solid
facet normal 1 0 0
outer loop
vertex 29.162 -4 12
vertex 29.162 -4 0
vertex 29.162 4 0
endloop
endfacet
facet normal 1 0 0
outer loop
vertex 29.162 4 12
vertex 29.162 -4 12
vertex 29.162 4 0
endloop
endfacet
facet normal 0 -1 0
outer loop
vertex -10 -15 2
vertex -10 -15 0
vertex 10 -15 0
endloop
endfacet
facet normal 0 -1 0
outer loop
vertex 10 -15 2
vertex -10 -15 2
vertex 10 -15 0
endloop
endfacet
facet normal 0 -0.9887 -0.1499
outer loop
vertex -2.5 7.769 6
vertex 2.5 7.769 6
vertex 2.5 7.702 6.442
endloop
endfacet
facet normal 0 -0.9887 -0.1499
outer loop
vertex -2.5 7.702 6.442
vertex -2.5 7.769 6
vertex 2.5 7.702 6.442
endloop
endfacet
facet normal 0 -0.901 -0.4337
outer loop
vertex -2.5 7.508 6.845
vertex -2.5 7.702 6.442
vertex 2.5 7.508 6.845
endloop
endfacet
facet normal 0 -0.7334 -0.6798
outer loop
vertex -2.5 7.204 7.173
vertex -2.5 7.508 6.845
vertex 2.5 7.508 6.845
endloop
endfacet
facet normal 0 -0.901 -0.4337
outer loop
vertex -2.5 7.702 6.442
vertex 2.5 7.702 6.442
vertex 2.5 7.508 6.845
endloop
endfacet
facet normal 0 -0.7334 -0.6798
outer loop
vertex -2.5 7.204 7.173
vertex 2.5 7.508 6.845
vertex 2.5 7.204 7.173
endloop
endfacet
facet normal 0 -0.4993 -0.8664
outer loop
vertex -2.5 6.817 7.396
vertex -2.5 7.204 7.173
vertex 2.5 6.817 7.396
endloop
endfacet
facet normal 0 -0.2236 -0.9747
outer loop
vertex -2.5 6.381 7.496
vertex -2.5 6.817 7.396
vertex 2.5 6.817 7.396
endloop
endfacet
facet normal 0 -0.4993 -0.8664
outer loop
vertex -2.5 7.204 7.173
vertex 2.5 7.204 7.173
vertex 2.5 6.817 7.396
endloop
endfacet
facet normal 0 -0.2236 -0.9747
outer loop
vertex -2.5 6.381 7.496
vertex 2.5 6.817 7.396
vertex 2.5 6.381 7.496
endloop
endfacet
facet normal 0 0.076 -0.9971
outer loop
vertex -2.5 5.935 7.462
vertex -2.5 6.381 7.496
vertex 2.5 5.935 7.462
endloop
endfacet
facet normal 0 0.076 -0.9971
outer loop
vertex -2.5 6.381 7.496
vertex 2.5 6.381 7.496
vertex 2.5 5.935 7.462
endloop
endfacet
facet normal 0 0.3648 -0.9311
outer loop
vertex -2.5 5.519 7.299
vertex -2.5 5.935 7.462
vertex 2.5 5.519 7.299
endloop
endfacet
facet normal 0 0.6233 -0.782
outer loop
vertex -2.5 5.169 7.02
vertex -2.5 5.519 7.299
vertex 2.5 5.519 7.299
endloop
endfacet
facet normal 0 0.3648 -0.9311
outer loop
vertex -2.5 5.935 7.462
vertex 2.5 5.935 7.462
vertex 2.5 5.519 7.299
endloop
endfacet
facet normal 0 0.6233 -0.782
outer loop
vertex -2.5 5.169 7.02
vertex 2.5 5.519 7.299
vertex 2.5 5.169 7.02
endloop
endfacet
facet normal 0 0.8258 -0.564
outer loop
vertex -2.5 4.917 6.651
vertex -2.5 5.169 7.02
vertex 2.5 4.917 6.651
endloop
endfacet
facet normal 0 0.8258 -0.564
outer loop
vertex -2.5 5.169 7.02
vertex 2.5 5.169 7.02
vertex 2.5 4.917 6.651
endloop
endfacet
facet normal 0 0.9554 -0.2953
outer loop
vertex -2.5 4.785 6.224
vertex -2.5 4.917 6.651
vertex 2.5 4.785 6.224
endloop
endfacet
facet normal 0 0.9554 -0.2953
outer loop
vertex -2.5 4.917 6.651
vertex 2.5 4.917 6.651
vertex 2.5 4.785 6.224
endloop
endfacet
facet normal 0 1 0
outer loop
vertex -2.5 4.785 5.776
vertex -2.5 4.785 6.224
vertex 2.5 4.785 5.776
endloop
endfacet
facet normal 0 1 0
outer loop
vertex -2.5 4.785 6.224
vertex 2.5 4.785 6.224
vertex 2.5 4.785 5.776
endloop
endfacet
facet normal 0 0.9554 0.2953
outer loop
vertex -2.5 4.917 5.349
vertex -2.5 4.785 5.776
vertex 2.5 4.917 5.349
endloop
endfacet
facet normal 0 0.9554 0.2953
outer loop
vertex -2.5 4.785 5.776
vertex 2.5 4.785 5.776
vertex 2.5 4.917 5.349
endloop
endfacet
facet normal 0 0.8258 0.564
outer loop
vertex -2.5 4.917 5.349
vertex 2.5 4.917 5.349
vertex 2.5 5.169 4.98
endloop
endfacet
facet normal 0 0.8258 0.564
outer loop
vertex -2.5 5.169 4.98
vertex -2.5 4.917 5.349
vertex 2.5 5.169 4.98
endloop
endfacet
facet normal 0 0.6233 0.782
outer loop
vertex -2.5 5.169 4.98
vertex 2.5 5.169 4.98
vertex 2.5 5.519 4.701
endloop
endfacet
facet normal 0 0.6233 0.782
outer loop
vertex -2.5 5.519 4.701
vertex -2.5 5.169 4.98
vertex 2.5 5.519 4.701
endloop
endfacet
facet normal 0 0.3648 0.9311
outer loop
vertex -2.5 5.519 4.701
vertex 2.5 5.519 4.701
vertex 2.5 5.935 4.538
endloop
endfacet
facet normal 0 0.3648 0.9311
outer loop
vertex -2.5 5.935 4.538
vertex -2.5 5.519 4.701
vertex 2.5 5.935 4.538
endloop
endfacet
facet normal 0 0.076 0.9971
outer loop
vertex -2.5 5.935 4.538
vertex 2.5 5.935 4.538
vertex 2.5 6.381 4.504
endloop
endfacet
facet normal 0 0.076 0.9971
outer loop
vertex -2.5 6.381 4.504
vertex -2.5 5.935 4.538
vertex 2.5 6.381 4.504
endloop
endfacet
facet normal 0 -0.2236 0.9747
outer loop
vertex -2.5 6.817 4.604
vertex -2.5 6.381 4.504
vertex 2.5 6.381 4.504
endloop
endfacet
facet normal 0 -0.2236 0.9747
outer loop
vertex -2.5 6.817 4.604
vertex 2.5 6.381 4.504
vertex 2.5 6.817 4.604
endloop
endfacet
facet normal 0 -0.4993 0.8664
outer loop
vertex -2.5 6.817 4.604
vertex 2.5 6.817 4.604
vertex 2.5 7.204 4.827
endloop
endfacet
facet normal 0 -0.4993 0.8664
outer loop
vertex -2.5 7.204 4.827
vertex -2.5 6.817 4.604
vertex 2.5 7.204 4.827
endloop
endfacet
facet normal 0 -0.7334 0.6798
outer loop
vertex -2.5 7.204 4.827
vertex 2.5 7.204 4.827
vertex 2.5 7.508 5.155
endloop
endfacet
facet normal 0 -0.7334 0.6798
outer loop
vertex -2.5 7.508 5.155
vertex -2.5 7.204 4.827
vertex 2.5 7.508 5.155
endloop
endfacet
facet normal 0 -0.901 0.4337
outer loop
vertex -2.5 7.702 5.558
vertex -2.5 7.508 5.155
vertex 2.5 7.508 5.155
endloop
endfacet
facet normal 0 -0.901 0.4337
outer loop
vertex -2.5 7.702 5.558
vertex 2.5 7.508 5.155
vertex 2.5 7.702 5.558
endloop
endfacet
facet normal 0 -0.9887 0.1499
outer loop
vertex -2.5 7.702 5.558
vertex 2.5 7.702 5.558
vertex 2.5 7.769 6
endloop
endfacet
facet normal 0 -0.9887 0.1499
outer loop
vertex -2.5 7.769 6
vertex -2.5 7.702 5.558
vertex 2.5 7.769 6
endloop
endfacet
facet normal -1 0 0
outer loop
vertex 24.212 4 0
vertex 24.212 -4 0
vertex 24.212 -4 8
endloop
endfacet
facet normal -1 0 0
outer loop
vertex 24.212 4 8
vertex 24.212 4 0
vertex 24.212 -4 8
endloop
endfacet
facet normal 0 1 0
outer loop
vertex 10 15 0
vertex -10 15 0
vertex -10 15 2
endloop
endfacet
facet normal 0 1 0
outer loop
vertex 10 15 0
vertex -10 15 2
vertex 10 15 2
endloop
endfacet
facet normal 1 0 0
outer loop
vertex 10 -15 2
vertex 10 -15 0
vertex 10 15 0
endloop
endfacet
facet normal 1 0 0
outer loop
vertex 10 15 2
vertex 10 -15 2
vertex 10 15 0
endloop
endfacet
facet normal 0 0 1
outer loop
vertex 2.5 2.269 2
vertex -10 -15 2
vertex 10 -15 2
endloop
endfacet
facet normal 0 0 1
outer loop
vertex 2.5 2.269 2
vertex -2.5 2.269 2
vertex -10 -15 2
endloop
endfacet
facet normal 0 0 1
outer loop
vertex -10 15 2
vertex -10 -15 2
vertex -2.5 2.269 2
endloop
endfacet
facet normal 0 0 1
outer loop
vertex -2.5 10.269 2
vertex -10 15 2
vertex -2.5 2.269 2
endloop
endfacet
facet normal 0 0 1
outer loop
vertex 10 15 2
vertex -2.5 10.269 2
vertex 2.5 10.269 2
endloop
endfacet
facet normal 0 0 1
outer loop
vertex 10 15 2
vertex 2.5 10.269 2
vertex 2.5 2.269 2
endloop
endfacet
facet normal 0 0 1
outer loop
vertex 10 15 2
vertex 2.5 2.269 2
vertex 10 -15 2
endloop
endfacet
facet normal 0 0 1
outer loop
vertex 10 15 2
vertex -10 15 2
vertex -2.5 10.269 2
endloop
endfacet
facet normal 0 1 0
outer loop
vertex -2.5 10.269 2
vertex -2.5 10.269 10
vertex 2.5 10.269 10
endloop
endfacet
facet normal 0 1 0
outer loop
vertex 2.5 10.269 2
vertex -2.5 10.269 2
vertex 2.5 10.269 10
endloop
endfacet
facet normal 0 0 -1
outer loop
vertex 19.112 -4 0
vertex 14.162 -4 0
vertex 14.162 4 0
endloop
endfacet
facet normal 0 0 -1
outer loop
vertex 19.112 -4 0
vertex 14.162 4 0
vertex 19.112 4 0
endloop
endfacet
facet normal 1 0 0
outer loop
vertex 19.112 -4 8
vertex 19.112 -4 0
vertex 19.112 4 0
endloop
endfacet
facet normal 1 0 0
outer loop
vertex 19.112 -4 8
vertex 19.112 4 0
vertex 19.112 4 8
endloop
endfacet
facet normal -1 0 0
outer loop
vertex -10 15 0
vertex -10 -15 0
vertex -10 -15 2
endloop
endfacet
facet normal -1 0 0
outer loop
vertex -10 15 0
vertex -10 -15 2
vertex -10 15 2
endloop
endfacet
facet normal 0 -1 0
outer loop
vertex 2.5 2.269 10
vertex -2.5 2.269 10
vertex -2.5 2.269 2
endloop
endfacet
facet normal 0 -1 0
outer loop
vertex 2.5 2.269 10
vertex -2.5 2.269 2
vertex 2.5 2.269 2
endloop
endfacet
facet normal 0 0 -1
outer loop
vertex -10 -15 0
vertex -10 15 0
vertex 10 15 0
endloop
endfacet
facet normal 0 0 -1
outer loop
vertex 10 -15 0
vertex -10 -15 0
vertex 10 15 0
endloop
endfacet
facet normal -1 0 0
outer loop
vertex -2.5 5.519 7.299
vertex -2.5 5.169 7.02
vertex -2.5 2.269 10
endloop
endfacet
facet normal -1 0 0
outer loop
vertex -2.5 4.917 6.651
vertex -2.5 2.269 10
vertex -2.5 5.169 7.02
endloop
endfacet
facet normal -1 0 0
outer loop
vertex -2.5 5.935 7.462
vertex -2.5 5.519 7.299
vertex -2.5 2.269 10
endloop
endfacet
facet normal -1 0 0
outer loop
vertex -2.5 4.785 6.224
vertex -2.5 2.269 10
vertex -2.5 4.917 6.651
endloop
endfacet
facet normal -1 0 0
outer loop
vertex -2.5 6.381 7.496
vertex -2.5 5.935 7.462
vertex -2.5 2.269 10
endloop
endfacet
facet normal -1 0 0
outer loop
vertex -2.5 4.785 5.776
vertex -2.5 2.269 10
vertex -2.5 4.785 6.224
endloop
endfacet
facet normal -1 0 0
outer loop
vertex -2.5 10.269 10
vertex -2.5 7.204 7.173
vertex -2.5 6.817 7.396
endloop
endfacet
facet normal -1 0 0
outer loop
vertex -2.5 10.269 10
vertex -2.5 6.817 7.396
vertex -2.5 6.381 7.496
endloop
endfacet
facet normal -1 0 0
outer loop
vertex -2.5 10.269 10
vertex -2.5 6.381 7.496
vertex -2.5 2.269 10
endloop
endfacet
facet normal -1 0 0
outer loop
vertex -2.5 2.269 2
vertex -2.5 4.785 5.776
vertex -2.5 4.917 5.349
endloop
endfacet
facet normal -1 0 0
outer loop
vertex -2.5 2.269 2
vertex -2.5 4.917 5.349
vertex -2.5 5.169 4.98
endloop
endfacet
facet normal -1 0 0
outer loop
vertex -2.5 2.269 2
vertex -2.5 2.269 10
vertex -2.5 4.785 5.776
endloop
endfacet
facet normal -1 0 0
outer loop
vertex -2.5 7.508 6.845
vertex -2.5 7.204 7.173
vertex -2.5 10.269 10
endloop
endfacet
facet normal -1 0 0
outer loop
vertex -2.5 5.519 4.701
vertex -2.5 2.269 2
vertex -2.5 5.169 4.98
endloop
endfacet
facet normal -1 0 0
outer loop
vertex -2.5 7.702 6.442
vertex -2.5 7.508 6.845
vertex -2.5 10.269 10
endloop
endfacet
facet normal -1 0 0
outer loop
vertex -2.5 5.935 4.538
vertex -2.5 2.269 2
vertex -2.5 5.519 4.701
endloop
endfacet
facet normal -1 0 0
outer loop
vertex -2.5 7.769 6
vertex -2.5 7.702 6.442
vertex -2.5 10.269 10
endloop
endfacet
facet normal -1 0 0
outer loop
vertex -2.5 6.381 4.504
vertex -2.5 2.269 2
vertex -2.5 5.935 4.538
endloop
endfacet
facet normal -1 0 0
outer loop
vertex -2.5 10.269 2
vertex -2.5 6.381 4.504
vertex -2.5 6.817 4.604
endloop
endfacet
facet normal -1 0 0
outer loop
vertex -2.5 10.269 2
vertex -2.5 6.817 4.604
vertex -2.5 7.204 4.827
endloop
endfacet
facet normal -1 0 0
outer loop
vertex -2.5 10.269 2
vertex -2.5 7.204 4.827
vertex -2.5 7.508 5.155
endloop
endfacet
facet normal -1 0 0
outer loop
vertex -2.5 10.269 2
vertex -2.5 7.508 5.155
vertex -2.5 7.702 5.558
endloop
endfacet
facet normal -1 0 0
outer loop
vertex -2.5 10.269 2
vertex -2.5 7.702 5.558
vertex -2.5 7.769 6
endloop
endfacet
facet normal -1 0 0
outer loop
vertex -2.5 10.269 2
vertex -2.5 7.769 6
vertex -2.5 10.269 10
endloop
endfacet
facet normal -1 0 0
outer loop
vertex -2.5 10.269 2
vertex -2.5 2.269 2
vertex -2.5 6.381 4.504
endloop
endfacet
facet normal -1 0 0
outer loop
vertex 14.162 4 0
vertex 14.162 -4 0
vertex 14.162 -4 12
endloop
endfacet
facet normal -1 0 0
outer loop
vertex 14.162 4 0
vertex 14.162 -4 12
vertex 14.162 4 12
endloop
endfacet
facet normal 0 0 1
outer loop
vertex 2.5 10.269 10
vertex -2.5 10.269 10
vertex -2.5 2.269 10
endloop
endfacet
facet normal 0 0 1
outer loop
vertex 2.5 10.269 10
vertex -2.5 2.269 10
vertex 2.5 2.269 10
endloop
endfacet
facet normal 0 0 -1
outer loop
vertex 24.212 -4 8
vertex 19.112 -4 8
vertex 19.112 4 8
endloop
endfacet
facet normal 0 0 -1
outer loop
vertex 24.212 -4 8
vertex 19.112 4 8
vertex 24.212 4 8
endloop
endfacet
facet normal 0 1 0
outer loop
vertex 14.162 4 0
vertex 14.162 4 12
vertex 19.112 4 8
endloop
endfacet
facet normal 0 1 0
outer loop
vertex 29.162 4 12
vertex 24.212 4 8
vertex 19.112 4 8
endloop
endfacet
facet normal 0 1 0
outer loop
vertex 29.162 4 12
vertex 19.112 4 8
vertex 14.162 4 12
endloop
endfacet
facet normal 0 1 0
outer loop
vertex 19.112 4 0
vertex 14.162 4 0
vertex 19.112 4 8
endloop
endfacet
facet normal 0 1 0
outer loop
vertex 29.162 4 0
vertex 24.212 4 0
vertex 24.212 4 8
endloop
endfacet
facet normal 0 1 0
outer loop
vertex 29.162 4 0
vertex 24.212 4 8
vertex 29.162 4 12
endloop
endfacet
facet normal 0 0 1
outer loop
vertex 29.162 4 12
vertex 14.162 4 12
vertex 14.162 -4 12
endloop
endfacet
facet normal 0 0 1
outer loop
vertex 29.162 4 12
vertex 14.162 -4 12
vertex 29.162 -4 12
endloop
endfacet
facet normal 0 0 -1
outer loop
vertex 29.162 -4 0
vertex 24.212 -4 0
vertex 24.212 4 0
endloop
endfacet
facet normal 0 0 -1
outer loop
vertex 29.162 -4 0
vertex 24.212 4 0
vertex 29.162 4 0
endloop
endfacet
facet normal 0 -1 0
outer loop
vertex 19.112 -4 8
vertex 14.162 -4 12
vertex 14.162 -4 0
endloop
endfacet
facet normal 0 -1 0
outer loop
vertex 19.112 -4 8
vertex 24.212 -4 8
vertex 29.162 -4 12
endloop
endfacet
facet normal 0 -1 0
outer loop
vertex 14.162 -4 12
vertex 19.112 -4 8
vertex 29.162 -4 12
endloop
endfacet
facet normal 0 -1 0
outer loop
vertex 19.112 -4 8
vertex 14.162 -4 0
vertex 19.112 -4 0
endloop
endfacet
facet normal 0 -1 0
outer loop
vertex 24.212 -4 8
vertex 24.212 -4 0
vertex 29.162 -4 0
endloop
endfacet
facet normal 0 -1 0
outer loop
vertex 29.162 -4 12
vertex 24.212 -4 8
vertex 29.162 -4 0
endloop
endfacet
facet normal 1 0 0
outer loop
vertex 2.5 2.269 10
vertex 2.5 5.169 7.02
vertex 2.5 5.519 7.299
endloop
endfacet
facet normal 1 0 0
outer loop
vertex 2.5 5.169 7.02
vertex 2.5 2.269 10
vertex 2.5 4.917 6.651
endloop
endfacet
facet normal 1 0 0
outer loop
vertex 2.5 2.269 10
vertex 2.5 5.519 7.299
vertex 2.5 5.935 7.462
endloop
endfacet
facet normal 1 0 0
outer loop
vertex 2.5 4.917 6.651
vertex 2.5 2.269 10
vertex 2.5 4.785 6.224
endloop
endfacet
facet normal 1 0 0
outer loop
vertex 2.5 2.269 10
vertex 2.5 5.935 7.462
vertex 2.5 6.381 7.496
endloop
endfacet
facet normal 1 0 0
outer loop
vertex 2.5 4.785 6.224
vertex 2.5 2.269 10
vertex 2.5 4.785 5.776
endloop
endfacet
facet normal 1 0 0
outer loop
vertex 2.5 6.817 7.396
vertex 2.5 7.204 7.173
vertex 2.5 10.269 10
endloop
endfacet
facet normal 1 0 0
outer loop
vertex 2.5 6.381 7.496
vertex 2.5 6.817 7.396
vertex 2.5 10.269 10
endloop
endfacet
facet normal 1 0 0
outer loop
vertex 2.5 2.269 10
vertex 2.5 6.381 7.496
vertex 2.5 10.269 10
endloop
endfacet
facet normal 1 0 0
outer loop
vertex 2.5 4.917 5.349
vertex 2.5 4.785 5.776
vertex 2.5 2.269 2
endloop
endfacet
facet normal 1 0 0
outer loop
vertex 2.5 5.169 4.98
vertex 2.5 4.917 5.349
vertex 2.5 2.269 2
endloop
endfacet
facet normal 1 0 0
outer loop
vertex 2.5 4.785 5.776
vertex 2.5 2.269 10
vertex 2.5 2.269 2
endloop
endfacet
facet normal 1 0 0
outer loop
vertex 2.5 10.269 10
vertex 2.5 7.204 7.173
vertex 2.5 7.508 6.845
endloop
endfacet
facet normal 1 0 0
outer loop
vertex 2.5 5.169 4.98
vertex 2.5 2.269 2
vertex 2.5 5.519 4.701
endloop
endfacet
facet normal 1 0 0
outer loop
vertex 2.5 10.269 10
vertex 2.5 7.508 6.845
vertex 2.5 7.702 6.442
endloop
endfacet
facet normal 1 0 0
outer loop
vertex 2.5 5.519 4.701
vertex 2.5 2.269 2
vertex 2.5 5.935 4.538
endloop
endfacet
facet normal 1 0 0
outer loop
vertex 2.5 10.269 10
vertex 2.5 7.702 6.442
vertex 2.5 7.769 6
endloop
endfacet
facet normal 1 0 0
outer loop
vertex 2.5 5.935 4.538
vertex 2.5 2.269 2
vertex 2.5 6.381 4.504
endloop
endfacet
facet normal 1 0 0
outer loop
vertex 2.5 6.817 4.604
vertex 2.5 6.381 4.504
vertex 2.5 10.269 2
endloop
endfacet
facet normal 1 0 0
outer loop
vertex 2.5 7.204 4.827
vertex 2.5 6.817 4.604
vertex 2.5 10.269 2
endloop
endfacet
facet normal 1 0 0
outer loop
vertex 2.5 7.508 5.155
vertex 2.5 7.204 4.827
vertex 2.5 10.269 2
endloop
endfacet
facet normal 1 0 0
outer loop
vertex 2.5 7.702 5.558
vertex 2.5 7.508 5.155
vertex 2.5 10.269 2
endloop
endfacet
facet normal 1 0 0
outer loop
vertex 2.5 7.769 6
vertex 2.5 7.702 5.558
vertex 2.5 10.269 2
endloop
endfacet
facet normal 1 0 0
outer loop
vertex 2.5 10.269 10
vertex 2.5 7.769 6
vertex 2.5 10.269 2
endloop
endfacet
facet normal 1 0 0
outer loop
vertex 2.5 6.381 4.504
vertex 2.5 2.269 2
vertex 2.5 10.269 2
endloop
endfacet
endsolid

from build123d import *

# Parameters (mm, degrees)
F0_W           = 20
F0_H           = 30
F1_DEPTH       = 2
F2_W           = 5
F2_H           = 8
F3_DEPTH       = 8
F4_R           = 1.5
F5_DEPTH       = 25
F5_DEPTH_BACK  = 25
F9_W           = 15
F9_H           = 8
F10_DEPTH      = 12
F11_W          = 5.1
F11_H          = 8
F12_DEPTH      = 25
F12_DEPTH_BACK = 25


with BuildPart() as f1:
    # F0 (on Top) → F1 (new body)
    with BuildSketch(Plane.XY):
        Rectangle(F0_W, F0_H)
    extrude(amount=F1_DEPTH)

    # F2 (on face) → F3 (join)
    with BuildSketch(Plane.XY.offset(2)):
        with Locations((0, 6.2686726451)):
            Rectangle(F2_W, F2_H)
    extrude(amount=F3_DEPTH)


with BuildPart() as f3:
    # F2 (on face) → F3, piece 2 (new body)
    with BuildSketch(Plane.XY.offset(2)):
        with Locations((16.2088256329, 6.2686726451)):
            Rectangle(F2_W, F2_H)
    extrude(amount=F3_DEPTH)


with BuildPart() as f5_tool:
    # F4 (on face) → F5 (new body, two sides)
    with BuildSketch(Plane.YZ.offset(2.5)) as f5_sk:
        with Locations((6.2686726451, 6)):
            Circle(F4_R)
    extrude(amount=-F5_DEPTH)
    extrude(f5_sk.sketch, amount=F5_DEPTH_BACK)


with BuildPart() as f1_1:
    add(f1.part)

    # F5: cut by f5_tool
    add(f5_tool.part, mode=Mode.SUBTRACT)


with BuildPart() as f3_1:
    add(f3.part)

    # F5: cut by f5_tool
    add(f5_tool.part, mode=Mode.SUBTRACT)


with BuildPart() as f6_1:
    # F6: copy of F3
    add(f3_1.part)


with BuildPart() as f10:
    # F9 (on Top) → F10 (new body)
    with BuildSketch(Plane.XY):
        with Locations((21.6618329287, 0)):
            Rectangle(F9_W, F9_H)
    extrude(amount=F10_DEPTH)

    # F11 (on face) → F12 (cut, two sides)
    with BuildSketch(Plane.XZ.offset(4)) as f12_sk:
        with Locations((21.6618329287, 4)):
            Rectangle(F11_W, F11_H)
    extrude(amount=-F12_DEPTH, mode=Mode.SUBTRACT)
    extrude(f12_sk.sketch, amount=F12_DEPTH_BACK, mode=Mode.SUBTRACT)


solid = Compound([f1_1.part, f10.part])
